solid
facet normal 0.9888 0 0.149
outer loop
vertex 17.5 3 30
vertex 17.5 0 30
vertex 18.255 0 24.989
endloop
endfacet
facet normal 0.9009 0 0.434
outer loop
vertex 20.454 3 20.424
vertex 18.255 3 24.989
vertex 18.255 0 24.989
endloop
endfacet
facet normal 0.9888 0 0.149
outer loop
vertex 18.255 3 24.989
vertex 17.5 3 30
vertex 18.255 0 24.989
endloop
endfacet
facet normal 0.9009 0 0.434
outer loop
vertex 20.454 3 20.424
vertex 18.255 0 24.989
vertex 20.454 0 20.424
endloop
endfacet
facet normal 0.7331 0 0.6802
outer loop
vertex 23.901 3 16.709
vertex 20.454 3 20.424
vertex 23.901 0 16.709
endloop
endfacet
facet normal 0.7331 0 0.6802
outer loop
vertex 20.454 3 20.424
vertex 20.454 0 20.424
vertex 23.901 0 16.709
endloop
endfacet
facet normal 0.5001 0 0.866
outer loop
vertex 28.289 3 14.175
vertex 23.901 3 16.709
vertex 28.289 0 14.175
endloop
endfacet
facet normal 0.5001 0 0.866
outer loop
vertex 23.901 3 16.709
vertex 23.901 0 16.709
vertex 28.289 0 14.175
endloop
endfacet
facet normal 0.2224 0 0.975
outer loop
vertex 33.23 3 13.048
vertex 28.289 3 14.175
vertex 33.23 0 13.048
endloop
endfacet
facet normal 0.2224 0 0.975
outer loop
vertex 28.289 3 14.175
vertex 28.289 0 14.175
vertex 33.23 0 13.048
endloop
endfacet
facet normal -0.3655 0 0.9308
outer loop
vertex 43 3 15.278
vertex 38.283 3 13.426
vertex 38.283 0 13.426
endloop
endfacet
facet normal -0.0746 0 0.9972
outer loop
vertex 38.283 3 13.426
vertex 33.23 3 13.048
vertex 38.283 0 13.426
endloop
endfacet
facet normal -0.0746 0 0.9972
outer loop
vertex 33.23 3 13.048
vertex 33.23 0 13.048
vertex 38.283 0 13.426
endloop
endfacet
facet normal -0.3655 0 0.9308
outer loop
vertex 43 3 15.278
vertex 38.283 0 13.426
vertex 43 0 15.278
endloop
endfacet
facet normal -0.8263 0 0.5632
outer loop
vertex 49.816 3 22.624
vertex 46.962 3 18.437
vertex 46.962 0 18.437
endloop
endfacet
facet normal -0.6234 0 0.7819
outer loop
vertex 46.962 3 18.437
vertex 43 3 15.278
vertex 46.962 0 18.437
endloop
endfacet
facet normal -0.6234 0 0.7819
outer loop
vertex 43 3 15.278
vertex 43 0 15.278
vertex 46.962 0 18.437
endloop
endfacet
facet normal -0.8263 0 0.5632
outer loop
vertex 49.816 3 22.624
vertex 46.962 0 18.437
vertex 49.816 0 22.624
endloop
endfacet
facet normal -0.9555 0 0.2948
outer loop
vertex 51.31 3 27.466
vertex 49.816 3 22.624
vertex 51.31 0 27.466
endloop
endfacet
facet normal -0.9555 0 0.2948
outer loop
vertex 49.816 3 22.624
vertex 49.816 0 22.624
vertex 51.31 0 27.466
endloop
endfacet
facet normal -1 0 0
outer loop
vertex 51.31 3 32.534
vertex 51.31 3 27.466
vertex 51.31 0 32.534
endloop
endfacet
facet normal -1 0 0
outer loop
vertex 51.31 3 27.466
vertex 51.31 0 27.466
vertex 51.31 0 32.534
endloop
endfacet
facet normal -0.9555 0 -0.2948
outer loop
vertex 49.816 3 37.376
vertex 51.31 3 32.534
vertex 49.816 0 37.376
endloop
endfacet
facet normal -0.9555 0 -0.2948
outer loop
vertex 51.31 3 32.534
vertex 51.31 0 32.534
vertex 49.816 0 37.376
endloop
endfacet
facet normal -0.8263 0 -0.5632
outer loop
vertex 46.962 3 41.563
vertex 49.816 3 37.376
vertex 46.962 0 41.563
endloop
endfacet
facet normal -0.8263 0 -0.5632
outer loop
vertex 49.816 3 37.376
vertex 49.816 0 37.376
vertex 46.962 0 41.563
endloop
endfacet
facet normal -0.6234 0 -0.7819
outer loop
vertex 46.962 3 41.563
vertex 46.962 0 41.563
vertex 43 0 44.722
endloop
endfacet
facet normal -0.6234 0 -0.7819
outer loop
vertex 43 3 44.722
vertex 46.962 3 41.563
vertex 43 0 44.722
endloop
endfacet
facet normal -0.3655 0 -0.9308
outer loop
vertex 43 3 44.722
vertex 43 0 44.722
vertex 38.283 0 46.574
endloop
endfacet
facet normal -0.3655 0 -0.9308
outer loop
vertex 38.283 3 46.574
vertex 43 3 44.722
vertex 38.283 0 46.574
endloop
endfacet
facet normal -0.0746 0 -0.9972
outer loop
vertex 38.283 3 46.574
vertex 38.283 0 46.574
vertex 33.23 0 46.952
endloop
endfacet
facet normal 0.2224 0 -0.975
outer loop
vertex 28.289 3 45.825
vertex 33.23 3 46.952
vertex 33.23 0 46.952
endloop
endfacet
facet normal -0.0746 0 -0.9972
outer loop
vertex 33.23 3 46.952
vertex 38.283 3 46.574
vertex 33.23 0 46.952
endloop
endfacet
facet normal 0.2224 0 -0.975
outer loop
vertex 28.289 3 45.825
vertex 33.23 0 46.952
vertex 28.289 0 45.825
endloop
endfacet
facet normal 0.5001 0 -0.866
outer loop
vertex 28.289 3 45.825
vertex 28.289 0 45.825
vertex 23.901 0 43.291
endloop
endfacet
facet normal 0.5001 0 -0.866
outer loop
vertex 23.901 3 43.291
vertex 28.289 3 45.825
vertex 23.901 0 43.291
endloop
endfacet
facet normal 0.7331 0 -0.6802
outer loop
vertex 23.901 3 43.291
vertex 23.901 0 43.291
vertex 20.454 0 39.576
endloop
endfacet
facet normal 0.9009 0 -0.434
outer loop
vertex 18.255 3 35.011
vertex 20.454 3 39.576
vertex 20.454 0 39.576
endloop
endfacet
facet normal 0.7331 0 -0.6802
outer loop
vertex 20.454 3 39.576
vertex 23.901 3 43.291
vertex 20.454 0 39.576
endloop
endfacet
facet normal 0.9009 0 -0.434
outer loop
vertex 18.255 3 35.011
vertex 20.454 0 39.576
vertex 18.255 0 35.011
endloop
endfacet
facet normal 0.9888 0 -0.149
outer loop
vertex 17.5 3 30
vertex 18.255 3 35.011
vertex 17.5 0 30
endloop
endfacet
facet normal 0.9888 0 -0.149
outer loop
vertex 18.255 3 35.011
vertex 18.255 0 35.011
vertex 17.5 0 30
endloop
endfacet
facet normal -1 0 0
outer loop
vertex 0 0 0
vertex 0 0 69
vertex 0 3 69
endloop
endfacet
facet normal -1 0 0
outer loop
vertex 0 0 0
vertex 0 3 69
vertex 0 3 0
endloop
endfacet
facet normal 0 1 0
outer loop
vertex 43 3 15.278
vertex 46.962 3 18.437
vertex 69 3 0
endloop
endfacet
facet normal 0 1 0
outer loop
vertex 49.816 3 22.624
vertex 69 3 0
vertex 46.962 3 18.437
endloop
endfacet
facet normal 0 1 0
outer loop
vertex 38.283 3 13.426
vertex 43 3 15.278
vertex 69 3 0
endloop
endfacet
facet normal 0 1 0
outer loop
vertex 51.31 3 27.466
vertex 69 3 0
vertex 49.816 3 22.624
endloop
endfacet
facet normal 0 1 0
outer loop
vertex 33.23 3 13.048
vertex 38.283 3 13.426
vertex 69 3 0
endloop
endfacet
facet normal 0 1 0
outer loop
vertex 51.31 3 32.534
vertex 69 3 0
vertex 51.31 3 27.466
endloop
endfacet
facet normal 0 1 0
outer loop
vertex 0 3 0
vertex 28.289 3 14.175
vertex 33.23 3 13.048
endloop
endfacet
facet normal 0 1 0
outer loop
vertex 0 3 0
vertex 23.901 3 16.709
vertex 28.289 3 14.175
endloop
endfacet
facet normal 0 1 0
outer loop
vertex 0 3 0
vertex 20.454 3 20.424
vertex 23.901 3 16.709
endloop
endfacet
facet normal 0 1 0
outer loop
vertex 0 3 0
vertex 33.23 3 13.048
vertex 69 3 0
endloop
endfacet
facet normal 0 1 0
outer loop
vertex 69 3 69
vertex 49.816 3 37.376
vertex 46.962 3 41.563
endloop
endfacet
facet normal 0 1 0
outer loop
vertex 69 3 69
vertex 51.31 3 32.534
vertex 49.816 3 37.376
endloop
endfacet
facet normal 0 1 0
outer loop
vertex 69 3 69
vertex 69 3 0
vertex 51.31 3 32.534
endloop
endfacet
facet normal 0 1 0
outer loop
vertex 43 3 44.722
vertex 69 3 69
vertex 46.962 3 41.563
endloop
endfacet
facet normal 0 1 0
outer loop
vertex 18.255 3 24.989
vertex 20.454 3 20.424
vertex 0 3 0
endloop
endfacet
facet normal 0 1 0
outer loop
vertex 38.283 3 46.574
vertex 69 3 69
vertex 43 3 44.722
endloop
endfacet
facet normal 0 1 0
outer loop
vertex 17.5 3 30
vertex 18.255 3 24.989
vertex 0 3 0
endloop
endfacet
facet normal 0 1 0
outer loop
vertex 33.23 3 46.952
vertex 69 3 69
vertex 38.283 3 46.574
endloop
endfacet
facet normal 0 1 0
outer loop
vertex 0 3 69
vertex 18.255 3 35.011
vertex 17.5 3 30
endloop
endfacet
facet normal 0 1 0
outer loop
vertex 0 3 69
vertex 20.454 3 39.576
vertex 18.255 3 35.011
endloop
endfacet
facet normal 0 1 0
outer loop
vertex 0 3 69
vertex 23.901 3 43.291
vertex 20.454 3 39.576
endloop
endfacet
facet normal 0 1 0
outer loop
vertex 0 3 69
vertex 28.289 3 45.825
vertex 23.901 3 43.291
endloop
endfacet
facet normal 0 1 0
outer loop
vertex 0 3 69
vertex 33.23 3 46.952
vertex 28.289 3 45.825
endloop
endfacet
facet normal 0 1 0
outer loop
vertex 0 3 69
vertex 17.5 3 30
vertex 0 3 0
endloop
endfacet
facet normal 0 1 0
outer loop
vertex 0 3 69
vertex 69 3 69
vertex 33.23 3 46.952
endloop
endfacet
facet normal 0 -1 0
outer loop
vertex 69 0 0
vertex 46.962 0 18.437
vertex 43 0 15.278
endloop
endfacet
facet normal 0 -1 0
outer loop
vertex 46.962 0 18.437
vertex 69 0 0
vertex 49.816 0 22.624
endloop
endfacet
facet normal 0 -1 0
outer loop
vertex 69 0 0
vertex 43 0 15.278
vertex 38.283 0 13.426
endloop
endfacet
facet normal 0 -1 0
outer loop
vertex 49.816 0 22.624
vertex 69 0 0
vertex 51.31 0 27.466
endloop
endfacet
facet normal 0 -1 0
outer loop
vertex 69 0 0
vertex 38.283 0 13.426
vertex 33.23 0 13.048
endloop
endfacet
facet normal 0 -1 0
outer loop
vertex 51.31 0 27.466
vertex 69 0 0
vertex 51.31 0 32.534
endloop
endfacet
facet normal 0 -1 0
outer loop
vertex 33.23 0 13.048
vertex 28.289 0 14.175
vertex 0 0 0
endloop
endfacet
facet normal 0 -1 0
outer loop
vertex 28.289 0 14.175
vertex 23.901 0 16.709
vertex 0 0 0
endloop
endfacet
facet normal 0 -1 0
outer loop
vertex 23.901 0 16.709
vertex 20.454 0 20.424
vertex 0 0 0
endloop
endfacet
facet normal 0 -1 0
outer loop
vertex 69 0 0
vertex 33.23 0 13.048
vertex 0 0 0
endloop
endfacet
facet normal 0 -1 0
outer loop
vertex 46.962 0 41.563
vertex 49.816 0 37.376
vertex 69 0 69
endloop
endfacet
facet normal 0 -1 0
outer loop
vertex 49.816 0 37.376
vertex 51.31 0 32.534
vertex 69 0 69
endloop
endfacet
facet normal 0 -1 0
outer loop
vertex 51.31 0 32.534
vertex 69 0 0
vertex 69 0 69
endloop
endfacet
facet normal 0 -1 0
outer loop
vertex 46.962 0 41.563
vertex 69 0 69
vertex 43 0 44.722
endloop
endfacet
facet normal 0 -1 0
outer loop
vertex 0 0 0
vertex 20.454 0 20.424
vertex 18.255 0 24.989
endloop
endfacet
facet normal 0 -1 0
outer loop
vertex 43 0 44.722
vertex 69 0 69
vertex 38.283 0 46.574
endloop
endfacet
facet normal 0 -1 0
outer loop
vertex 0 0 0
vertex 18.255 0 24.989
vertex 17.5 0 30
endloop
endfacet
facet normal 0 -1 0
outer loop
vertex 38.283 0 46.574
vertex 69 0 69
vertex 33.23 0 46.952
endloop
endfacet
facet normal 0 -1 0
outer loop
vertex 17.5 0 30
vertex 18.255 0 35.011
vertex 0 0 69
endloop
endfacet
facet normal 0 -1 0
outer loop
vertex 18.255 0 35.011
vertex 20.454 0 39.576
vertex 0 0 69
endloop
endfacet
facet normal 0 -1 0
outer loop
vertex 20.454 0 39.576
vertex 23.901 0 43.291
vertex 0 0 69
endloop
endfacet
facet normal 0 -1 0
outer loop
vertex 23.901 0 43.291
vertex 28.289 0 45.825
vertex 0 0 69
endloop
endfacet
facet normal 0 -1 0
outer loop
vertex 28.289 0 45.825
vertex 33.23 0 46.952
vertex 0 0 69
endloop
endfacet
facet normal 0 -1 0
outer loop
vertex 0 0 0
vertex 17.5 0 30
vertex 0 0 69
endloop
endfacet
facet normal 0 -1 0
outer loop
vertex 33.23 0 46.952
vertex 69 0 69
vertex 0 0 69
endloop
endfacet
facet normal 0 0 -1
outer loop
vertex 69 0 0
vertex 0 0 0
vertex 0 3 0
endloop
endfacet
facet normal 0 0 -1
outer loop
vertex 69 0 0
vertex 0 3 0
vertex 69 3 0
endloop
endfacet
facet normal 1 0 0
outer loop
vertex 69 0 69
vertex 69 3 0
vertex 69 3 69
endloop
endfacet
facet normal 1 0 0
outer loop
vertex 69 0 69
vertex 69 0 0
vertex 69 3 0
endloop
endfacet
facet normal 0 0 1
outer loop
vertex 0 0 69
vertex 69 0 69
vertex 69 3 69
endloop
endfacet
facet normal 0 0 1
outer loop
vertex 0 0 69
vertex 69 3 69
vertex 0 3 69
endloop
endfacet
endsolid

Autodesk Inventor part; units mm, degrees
ref_plane "YZ Plane" through (0, 0, 0) normal (1, 0, 0) x (0, 1, 0)
ref_plane "XZ Plane" through (0, 0, 0) normal (0, 1, 0) x (-1, 0, 0)
ref_plane "XY Plane" through (0, 0, 0) normal (0, 0, 1) x (1, 0, 0)
sketch "Sketch1" plane through (0, 0, 0) normal (0, 1, 0) x (-1, 0, 0)
  line L0 (0, 0) -> (-69, 0)
  line L1 (-69, 0) -> (-69, 69)
  line L2 (-69, 69) -> (0, 69)
  line L3 (0, 69) -> (0, 0)
  circle A0 centre (-34.5, 30) radius 17
  dimension "d0" = 69
  dimension "d1" = 69
  dimension "d2" = 34
  dimension "d5" = 30
extrude "Extrusion1" add sketch "Sketch1" along normal blind 3
properties part number "field-mover-motor-case"
